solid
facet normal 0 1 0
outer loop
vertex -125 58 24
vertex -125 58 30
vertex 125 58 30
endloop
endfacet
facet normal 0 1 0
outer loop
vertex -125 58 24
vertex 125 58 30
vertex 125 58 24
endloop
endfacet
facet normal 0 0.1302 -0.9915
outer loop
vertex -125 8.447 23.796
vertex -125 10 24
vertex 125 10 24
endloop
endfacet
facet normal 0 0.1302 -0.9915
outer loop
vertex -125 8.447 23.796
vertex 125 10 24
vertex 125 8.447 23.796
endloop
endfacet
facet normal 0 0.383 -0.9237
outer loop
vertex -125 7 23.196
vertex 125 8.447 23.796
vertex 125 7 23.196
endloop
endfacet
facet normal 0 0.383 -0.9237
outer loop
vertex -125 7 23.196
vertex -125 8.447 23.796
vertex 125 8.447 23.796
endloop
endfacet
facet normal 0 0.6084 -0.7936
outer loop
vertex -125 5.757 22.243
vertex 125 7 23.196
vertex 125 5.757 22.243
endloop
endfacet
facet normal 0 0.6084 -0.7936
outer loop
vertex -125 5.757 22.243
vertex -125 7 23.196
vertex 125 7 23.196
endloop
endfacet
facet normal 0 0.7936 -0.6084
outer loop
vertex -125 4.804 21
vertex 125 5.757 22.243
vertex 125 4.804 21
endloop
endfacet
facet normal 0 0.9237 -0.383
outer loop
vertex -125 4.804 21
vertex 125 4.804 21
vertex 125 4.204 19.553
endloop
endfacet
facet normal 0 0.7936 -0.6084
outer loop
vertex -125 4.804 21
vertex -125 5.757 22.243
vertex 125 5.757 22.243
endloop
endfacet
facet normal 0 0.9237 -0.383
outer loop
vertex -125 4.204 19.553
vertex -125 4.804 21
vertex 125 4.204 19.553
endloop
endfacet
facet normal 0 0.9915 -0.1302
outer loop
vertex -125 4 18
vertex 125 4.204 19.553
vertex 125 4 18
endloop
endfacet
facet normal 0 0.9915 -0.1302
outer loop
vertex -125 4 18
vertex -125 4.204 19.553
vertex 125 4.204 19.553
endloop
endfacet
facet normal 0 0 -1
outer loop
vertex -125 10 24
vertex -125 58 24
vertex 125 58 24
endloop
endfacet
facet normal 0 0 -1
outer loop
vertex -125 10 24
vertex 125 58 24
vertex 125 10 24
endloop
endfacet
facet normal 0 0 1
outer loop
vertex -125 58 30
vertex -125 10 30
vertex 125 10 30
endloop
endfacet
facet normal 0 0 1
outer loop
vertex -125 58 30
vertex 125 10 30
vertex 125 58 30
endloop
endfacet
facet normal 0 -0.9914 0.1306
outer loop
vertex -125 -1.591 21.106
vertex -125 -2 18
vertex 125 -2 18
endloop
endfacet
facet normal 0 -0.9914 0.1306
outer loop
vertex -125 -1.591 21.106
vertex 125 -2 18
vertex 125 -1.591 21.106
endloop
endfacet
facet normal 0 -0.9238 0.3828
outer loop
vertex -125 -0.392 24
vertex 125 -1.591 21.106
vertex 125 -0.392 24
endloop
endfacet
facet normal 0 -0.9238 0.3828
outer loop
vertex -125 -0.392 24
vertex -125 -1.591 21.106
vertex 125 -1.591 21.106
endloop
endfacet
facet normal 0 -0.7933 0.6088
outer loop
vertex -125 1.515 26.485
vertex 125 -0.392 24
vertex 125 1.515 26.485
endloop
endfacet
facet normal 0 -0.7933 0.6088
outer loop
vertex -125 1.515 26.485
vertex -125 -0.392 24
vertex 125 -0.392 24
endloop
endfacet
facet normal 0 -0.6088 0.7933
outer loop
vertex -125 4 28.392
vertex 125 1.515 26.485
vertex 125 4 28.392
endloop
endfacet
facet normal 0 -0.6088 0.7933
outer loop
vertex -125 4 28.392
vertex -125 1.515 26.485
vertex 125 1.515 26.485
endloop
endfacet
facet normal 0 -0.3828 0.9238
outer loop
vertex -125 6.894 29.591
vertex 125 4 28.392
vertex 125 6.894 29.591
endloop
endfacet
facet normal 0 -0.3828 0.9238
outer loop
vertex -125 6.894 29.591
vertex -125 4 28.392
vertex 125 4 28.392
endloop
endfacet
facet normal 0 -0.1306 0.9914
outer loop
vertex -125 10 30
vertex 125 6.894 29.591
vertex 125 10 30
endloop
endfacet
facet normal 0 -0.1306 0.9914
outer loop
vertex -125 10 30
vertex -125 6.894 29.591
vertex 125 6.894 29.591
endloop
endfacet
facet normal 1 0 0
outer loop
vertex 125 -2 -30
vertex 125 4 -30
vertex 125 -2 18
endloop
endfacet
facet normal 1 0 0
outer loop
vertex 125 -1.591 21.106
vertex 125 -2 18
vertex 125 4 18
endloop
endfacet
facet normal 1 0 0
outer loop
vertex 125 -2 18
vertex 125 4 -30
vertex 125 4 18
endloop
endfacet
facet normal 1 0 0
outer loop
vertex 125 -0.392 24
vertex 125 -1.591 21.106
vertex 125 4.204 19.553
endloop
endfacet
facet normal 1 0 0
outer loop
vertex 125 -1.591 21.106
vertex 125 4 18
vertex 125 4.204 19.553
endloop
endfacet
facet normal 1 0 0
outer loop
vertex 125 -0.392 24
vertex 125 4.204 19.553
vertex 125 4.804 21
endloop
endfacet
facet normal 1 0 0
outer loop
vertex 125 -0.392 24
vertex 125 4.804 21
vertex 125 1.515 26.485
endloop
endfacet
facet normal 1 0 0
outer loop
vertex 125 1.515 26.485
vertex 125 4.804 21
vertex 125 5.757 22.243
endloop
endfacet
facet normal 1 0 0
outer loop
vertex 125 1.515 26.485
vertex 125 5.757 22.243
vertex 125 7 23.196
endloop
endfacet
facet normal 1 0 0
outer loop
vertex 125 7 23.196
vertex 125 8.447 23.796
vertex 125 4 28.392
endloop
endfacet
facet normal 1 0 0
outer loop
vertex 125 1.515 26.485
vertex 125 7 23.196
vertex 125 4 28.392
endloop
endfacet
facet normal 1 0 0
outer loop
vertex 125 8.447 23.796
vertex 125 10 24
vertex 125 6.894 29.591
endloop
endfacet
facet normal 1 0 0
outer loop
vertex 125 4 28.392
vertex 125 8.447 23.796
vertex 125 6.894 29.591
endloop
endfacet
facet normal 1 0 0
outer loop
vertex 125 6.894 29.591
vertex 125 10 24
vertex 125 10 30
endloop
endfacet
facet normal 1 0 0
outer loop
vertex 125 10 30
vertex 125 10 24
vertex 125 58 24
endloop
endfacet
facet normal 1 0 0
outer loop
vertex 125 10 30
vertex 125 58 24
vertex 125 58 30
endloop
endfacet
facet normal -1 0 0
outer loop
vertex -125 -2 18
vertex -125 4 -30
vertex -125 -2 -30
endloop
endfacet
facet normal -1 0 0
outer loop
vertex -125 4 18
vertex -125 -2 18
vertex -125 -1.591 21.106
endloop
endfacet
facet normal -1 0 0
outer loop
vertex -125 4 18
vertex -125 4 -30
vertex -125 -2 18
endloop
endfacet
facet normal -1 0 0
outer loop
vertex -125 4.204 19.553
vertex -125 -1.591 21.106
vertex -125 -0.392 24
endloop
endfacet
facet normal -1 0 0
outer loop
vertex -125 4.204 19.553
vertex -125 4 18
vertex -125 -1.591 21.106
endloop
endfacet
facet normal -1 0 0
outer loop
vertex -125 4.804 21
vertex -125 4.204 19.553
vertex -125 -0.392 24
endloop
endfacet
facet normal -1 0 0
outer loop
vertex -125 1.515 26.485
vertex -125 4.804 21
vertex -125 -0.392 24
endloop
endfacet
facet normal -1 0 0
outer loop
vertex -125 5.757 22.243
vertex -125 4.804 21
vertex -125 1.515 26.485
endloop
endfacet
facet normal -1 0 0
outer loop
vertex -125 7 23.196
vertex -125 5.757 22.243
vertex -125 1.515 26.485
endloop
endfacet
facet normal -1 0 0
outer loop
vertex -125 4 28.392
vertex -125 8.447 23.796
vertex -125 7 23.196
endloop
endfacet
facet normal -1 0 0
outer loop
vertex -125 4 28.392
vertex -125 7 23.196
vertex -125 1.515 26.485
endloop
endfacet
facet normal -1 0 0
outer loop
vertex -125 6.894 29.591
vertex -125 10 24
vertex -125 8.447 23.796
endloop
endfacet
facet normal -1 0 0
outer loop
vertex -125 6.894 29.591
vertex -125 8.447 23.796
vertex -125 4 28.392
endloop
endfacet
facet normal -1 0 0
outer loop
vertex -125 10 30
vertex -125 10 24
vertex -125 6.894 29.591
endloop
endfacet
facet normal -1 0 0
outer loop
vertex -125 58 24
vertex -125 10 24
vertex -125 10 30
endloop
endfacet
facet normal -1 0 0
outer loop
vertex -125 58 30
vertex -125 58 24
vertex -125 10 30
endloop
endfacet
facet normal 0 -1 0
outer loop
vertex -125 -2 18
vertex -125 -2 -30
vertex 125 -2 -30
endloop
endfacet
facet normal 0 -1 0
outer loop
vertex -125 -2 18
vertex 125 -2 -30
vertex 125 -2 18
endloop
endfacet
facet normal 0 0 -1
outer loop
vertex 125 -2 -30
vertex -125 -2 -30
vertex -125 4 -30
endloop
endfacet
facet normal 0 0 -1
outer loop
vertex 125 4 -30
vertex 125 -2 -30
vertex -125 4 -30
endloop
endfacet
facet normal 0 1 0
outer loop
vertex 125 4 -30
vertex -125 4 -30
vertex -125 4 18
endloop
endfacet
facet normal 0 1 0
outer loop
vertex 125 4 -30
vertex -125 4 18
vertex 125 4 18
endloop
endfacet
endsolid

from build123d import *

# Parameters (mm, degrees)
SKETCH1_W                    = 250
SKETCH1_H                    = 60
BOSS_EXTRUDE1_DEPTH          = 4
CONVERT_SOLID1_START         = -125
CONVERT_SOLID1_OUTLINE_W     = 2
CONVERT_SOLID1_OUTLINE_H     = 60
CONVERT_SOLID1_DEPTH         = 250
EDGE_FLANGE1_STRIP_W         = 36
EDGE_FLANGE1_STRIP_H         = 6
EDGE_FLANGE1_STRIP_CUT_DEPTH = 250
EDGE_FLANGE1_DEPTH           = 250


# Read off the part's stored shape, not the designer's step: Convert-Solid1
# Sheet-metal steps are written as plain solids
with BuildPart() as part:
    # Sketch1 → Boss-Extrude1 (new body)
    with BuildSketch(Plane(origin=(0, 0, 0), x_dir=(1, 0, 0), z_dir=(0, 1, 0))):
        Rectangle(SKETCH1_W, SKETCH1_H)
    extrude(amount=BOSS_EXTRUDE1_DEPTH)

    # Convert-Solid1 outline → Convert-Solid1 (add)
    with BuildSketch(Plane.YZ.offset(CONVERT_SOLID1_START)):
        with Locations((-1, 0)):
            Rectangle(CONVERT_SOLID1_OUTLINE_W, CONVERT_SOLID1_OUTLINE_H)
    extrude(amount=CONVERT_SOLID1_DEPTH)

    # Edge-Flange1 strip (across the edge) → Edge-Flange1 strip cut (cut)
    with BuildSketch(Plane(origin=(-125, 4, 30), x_dir=(0, 0, -1), z_dir=(1, 0, 0))):
        with Locations((-6, -3)):
            Rectangle(EDGE_FLANGE1_STRIP_W, EDGE_FLANGE1_STRIP_H)
    extrude(amount=EDGE_FLANGE1_STRIP_CUT_DEPTH, mode=Mode.SUBTRACT)

    # Edge-Flange1 section (across the edge) → Edge-Flange1 (add)
    with BuildSketch(Plane(origin=(-125, 4, 30), x_dir=(0, 0, -1), z_dir=(1, 0, 0))):
        with BuildLine():
            Line((0, 6), (0, 54))
            Line((0, 54), (6, 54))
            Line((6, 54), (6, 6))
            ThreePointArc((6, 6), (7.757359313, 1.757359313), (12, 0))
            Line((12, 0), (12, -6))
            ThreePointArc((12, -6), (3.514718626, -2.485281374), (0, 6))
        make_face()
    extrude(amount=EDGE_FLANGE1_DEPTH)


solid = part.part
